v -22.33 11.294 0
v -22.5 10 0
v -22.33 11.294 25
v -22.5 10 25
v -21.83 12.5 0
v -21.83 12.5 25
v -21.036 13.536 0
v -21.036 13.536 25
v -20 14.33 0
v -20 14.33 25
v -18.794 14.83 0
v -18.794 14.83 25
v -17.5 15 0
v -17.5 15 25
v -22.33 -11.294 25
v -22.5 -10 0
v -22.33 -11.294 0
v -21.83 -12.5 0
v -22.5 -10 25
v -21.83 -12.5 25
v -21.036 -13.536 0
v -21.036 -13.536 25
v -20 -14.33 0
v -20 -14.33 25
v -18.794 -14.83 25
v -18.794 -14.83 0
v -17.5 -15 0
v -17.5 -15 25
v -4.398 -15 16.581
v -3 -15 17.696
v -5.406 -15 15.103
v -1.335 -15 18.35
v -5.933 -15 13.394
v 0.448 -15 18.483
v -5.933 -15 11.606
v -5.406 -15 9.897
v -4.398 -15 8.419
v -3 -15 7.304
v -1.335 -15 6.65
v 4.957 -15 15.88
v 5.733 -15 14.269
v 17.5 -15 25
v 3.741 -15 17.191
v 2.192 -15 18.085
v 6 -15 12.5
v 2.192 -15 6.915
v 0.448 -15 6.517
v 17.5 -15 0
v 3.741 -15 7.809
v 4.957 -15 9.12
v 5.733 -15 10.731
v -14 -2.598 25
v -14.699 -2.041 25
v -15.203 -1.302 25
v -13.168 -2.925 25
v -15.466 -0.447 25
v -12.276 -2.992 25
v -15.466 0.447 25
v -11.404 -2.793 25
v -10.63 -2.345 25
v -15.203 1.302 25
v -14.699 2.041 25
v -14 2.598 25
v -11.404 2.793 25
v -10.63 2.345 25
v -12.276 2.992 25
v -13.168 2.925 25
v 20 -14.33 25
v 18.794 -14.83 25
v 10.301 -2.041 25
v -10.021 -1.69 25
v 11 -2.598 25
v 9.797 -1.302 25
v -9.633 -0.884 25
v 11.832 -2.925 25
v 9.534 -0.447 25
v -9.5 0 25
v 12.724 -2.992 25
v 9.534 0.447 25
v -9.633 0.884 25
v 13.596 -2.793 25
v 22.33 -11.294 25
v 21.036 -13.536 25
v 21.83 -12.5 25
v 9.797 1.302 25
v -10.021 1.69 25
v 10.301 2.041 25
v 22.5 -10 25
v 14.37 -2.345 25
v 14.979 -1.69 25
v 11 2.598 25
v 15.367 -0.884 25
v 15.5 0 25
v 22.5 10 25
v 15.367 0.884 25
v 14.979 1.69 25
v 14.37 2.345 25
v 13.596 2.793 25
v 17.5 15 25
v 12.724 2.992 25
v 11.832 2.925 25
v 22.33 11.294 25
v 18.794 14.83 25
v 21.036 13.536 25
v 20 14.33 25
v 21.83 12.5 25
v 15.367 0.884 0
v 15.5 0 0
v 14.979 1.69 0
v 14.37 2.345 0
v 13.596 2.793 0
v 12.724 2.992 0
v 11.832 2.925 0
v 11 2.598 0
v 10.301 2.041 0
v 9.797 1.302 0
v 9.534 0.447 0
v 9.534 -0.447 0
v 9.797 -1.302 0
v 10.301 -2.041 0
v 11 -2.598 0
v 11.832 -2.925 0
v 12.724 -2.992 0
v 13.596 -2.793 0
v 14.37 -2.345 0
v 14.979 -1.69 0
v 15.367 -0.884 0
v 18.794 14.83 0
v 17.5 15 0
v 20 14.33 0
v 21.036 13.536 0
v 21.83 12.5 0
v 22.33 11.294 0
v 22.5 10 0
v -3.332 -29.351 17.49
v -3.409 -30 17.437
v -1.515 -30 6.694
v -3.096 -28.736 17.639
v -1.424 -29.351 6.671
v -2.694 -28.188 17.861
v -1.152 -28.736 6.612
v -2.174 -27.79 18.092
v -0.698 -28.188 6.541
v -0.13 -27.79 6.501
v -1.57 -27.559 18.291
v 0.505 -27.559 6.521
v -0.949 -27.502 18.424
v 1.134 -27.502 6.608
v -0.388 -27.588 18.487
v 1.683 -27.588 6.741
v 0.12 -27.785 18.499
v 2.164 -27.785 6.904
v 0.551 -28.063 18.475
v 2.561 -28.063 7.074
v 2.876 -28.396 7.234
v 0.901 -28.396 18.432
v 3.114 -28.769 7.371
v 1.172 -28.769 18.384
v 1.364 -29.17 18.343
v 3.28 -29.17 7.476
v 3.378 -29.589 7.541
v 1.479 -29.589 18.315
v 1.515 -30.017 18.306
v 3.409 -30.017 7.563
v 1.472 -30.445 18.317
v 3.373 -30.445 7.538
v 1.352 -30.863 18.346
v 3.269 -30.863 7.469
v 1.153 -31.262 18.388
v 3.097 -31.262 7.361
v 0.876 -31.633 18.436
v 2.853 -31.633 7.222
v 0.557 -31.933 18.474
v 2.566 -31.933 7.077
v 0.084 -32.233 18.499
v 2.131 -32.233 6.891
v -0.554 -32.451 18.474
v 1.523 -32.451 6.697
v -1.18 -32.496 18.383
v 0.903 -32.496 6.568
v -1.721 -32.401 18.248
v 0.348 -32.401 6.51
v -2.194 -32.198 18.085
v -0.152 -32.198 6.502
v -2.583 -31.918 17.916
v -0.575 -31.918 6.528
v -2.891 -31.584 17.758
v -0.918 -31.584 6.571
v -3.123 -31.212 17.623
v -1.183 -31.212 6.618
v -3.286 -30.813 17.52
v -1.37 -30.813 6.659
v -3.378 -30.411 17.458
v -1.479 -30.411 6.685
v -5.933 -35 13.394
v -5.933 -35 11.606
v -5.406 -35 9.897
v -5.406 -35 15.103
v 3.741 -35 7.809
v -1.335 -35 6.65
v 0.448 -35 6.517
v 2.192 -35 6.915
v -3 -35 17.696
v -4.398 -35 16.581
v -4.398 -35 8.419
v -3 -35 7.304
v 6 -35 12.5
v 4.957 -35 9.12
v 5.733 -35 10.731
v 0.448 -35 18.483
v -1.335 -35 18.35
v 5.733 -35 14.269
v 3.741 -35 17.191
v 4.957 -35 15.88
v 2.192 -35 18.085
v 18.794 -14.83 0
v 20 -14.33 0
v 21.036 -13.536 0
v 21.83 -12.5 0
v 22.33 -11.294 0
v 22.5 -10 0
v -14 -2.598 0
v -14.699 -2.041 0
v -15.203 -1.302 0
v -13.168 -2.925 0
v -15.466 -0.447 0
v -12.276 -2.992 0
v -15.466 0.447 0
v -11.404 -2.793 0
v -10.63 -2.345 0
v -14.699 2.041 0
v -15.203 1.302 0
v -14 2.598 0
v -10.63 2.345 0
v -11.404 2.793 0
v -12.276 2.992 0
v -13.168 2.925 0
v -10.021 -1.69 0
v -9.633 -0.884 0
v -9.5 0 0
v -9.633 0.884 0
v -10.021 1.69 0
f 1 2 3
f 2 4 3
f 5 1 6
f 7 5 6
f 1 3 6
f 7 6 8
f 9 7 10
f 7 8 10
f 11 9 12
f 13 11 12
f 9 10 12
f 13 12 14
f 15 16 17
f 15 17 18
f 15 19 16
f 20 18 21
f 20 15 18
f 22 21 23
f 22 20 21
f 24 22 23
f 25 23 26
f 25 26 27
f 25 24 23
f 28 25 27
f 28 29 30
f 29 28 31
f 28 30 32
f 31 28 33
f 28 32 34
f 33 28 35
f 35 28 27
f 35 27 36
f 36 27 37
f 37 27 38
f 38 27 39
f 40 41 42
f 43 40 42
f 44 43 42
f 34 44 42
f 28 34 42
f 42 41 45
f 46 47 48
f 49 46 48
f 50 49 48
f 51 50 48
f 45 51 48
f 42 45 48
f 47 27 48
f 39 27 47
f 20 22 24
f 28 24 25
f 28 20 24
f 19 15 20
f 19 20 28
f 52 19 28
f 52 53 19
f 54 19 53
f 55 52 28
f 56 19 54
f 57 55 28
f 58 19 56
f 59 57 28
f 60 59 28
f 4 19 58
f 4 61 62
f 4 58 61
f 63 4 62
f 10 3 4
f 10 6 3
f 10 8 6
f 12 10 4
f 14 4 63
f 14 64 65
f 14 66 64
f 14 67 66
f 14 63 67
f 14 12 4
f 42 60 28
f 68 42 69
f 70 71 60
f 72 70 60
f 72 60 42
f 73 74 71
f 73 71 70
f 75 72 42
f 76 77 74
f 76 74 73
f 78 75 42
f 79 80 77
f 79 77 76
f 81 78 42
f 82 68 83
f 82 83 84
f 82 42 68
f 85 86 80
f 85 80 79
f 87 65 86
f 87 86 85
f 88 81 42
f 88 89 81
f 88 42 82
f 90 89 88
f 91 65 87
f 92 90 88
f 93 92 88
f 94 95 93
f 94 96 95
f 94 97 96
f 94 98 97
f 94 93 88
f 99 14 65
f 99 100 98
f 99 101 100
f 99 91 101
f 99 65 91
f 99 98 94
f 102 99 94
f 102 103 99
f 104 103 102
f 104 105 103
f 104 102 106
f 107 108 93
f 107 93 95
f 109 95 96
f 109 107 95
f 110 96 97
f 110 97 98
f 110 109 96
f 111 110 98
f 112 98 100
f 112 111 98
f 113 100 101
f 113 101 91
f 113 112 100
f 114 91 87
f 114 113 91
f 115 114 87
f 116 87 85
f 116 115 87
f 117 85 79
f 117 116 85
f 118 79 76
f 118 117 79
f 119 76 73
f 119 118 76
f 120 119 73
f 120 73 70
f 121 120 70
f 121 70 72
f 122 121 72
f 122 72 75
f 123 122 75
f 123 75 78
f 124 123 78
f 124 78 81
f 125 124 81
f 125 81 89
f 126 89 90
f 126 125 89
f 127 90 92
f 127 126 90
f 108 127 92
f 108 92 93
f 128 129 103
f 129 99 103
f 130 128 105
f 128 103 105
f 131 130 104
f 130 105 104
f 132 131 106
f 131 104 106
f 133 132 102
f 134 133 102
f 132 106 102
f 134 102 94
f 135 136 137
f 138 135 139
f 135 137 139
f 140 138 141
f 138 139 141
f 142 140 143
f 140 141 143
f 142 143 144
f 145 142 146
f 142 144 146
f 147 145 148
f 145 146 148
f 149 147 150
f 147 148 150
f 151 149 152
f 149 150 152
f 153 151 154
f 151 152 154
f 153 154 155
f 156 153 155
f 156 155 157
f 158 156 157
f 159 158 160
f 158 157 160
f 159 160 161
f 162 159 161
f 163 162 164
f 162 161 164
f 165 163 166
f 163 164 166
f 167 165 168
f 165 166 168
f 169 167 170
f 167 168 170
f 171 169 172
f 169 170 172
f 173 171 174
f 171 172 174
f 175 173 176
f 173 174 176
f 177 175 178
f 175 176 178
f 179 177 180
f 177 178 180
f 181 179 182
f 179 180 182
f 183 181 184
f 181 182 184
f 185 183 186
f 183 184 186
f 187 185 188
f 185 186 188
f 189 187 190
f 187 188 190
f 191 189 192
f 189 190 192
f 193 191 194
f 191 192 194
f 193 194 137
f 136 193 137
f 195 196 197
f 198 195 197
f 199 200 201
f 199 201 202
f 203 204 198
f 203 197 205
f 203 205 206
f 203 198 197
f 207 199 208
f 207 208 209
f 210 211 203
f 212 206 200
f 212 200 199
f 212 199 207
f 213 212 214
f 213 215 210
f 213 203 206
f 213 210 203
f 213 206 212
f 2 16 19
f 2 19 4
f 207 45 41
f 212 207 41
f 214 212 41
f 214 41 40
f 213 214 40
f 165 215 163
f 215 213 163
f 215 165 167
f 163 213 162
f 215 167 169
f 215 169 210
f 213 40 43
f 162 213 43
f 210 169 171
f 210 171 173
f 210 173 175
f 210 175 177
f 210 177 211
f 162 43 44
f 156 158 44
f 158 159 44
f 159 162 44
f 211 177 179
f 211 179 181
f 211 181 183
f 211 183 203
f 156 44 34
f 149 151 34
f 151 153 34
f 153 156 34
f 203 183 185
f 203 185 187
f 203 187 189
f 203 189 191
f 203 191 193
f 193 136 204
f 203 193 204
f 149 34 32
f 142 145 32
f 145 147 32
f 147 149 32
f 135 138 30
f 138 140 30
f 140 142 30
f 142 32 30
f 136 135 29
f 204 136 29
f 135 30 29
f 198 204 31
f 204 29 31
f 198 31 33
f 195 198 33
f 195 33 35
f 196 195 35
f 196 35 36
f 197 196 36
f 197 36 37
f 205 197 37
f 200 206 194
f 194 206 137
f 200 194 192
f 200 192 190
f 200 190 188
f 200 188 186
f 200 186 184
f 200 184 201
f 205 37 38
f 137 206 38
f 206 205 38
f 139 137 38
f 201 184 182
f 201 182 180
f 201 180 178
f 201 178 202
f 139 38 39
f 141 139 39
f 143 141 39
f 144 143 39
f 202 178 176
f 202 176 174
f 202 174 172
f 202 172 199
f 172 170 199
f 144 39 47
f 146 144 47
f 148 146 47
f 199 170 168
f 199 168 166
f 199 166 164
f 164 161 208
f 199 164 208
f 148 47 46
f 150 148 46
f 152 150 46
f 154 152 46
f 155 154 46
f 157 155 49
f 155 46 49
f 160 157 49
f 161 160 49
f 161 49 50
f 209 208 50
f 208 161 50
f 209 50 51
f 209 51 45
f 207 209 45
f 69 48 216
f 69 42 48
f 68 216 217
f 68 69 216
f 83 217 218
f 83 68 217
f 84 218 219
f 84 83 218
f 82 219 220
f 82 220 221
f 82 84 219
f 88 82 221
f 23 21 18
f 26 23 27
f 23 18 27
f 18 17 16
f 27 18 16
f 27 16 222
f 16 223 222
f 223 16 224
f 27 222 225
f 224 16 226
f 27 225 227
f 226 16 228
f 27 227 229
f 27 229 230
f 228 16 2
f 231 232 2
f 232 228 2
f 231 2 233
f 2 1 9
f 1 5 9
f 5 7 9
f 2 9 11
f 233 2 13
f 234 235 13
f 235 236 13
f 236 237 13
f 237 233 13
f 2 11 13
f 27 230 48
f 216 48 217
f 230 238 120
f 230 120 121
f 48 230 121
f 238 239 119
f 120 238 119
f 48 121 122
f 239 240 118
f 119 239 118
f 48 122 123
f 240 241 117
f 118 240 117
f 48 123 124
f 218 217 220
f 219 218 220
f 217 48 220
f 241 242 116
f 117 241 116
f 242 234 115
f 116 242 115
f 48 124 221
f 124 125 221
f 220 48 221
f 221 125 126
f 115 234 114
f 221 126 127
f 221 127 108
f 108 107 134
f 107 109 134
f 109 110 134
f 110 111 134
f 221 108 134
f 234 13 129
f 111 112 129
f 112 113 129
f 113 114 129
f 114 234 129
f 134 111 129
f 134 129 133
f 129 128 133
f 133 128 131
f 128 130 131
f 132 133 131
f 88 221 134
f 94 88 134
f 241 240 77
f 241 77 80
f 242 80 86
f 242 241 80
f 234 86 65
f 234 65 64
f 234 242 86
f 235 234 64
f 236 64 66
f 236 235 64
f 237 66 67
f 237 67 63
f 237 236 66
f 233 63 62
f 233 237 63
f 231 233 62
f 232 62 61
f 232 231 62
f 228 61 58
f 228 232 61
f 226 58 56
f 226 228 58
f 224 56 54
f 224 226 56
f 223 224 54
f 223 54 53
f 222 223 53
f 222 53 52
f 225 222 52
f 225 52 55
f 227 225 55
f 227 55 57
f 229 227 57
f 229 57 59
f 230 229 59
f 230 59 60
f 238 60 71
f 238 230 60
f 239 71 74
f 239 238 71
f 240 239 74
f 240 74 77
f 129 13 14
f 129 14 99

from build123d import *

# Parameters (mm, degrees)
SKETCH_1_W               = 45
SKETCH_1_H               = 30
SKETCH_1_R               = 3
EXTRUDE_1_DEPTH          = 25
FILLET_1_R               = 5
SKETCH_2_R               = 6
EXTRUDE_2_DEPTH          = 20
CUT_EXTRUDE_1_DEPTH      = 45.697065981
CUT_EXTRUDE_1_DEPTH_BACK = 45.697065981
SKETCH_3_R               = 2.5


with BuildPart() as part:
    # 草图1 → 凸台-拉伸1 (new body)
    with BuildSketch(Plane.XY):
        Rectangle(SKETCH_1_W, SKETCH_1_H)
        with Locations((-12.5, 0)):
            Circle(SKETCH_1_R, mode=Mode.SUBTRACT)
        with Locations((12.5, 0)):
            Circle(SKETCH_1_R, mode=Mode.SUBTRACT)
    extrude(amount=EXTRUDE_1_DEPTH)

    # 圆角1
    fillet_1_edges = [part.edges().sort_by_distance(p)[0] for p in [
        (22.5, 15, 12.5),
        (22.5, -15, 12.5),
        (-22.5, -15, 12.5),
        (-22.5, 15, 12.5),
    ]]
    fillet(fillet_1_edges, radius=FILLET_1_R)

    # 草图2 → 凸台-拉伸2 (add)
    with BuildSketch(Plane.XZ.offset(15)):
        with Locations((0, 12.5)):
            Circle(SKETCH_2_R)
    extrude(amount=EXTRUDE_2_DEPTH)

    # 草图3 → 切除-拉伸1 (cut, two sides: drawn at the far end of the back side and taken through both)
    with BuildSketch(Plane(origin=(-2.137625896, 0, 12.12307888), x_dir=(-0.9848077530122086, 0, -0.17364817766692736), z_dir=(0.17364817766692736, 0, -0.9848077530122086)).offset(-CUT_EXTRUDE_1_DEPTH_BACK)):
        with Locations((-2.170602221, -30)):
            Circle(SKETCH_3_R)
    extrude(amount=CUT_EXTRUDE_1_DEPTH + CUT_EXTRUDE_1_DEPTH_BACK, mode=Mode.SUBTRACT)


solid = part.part
